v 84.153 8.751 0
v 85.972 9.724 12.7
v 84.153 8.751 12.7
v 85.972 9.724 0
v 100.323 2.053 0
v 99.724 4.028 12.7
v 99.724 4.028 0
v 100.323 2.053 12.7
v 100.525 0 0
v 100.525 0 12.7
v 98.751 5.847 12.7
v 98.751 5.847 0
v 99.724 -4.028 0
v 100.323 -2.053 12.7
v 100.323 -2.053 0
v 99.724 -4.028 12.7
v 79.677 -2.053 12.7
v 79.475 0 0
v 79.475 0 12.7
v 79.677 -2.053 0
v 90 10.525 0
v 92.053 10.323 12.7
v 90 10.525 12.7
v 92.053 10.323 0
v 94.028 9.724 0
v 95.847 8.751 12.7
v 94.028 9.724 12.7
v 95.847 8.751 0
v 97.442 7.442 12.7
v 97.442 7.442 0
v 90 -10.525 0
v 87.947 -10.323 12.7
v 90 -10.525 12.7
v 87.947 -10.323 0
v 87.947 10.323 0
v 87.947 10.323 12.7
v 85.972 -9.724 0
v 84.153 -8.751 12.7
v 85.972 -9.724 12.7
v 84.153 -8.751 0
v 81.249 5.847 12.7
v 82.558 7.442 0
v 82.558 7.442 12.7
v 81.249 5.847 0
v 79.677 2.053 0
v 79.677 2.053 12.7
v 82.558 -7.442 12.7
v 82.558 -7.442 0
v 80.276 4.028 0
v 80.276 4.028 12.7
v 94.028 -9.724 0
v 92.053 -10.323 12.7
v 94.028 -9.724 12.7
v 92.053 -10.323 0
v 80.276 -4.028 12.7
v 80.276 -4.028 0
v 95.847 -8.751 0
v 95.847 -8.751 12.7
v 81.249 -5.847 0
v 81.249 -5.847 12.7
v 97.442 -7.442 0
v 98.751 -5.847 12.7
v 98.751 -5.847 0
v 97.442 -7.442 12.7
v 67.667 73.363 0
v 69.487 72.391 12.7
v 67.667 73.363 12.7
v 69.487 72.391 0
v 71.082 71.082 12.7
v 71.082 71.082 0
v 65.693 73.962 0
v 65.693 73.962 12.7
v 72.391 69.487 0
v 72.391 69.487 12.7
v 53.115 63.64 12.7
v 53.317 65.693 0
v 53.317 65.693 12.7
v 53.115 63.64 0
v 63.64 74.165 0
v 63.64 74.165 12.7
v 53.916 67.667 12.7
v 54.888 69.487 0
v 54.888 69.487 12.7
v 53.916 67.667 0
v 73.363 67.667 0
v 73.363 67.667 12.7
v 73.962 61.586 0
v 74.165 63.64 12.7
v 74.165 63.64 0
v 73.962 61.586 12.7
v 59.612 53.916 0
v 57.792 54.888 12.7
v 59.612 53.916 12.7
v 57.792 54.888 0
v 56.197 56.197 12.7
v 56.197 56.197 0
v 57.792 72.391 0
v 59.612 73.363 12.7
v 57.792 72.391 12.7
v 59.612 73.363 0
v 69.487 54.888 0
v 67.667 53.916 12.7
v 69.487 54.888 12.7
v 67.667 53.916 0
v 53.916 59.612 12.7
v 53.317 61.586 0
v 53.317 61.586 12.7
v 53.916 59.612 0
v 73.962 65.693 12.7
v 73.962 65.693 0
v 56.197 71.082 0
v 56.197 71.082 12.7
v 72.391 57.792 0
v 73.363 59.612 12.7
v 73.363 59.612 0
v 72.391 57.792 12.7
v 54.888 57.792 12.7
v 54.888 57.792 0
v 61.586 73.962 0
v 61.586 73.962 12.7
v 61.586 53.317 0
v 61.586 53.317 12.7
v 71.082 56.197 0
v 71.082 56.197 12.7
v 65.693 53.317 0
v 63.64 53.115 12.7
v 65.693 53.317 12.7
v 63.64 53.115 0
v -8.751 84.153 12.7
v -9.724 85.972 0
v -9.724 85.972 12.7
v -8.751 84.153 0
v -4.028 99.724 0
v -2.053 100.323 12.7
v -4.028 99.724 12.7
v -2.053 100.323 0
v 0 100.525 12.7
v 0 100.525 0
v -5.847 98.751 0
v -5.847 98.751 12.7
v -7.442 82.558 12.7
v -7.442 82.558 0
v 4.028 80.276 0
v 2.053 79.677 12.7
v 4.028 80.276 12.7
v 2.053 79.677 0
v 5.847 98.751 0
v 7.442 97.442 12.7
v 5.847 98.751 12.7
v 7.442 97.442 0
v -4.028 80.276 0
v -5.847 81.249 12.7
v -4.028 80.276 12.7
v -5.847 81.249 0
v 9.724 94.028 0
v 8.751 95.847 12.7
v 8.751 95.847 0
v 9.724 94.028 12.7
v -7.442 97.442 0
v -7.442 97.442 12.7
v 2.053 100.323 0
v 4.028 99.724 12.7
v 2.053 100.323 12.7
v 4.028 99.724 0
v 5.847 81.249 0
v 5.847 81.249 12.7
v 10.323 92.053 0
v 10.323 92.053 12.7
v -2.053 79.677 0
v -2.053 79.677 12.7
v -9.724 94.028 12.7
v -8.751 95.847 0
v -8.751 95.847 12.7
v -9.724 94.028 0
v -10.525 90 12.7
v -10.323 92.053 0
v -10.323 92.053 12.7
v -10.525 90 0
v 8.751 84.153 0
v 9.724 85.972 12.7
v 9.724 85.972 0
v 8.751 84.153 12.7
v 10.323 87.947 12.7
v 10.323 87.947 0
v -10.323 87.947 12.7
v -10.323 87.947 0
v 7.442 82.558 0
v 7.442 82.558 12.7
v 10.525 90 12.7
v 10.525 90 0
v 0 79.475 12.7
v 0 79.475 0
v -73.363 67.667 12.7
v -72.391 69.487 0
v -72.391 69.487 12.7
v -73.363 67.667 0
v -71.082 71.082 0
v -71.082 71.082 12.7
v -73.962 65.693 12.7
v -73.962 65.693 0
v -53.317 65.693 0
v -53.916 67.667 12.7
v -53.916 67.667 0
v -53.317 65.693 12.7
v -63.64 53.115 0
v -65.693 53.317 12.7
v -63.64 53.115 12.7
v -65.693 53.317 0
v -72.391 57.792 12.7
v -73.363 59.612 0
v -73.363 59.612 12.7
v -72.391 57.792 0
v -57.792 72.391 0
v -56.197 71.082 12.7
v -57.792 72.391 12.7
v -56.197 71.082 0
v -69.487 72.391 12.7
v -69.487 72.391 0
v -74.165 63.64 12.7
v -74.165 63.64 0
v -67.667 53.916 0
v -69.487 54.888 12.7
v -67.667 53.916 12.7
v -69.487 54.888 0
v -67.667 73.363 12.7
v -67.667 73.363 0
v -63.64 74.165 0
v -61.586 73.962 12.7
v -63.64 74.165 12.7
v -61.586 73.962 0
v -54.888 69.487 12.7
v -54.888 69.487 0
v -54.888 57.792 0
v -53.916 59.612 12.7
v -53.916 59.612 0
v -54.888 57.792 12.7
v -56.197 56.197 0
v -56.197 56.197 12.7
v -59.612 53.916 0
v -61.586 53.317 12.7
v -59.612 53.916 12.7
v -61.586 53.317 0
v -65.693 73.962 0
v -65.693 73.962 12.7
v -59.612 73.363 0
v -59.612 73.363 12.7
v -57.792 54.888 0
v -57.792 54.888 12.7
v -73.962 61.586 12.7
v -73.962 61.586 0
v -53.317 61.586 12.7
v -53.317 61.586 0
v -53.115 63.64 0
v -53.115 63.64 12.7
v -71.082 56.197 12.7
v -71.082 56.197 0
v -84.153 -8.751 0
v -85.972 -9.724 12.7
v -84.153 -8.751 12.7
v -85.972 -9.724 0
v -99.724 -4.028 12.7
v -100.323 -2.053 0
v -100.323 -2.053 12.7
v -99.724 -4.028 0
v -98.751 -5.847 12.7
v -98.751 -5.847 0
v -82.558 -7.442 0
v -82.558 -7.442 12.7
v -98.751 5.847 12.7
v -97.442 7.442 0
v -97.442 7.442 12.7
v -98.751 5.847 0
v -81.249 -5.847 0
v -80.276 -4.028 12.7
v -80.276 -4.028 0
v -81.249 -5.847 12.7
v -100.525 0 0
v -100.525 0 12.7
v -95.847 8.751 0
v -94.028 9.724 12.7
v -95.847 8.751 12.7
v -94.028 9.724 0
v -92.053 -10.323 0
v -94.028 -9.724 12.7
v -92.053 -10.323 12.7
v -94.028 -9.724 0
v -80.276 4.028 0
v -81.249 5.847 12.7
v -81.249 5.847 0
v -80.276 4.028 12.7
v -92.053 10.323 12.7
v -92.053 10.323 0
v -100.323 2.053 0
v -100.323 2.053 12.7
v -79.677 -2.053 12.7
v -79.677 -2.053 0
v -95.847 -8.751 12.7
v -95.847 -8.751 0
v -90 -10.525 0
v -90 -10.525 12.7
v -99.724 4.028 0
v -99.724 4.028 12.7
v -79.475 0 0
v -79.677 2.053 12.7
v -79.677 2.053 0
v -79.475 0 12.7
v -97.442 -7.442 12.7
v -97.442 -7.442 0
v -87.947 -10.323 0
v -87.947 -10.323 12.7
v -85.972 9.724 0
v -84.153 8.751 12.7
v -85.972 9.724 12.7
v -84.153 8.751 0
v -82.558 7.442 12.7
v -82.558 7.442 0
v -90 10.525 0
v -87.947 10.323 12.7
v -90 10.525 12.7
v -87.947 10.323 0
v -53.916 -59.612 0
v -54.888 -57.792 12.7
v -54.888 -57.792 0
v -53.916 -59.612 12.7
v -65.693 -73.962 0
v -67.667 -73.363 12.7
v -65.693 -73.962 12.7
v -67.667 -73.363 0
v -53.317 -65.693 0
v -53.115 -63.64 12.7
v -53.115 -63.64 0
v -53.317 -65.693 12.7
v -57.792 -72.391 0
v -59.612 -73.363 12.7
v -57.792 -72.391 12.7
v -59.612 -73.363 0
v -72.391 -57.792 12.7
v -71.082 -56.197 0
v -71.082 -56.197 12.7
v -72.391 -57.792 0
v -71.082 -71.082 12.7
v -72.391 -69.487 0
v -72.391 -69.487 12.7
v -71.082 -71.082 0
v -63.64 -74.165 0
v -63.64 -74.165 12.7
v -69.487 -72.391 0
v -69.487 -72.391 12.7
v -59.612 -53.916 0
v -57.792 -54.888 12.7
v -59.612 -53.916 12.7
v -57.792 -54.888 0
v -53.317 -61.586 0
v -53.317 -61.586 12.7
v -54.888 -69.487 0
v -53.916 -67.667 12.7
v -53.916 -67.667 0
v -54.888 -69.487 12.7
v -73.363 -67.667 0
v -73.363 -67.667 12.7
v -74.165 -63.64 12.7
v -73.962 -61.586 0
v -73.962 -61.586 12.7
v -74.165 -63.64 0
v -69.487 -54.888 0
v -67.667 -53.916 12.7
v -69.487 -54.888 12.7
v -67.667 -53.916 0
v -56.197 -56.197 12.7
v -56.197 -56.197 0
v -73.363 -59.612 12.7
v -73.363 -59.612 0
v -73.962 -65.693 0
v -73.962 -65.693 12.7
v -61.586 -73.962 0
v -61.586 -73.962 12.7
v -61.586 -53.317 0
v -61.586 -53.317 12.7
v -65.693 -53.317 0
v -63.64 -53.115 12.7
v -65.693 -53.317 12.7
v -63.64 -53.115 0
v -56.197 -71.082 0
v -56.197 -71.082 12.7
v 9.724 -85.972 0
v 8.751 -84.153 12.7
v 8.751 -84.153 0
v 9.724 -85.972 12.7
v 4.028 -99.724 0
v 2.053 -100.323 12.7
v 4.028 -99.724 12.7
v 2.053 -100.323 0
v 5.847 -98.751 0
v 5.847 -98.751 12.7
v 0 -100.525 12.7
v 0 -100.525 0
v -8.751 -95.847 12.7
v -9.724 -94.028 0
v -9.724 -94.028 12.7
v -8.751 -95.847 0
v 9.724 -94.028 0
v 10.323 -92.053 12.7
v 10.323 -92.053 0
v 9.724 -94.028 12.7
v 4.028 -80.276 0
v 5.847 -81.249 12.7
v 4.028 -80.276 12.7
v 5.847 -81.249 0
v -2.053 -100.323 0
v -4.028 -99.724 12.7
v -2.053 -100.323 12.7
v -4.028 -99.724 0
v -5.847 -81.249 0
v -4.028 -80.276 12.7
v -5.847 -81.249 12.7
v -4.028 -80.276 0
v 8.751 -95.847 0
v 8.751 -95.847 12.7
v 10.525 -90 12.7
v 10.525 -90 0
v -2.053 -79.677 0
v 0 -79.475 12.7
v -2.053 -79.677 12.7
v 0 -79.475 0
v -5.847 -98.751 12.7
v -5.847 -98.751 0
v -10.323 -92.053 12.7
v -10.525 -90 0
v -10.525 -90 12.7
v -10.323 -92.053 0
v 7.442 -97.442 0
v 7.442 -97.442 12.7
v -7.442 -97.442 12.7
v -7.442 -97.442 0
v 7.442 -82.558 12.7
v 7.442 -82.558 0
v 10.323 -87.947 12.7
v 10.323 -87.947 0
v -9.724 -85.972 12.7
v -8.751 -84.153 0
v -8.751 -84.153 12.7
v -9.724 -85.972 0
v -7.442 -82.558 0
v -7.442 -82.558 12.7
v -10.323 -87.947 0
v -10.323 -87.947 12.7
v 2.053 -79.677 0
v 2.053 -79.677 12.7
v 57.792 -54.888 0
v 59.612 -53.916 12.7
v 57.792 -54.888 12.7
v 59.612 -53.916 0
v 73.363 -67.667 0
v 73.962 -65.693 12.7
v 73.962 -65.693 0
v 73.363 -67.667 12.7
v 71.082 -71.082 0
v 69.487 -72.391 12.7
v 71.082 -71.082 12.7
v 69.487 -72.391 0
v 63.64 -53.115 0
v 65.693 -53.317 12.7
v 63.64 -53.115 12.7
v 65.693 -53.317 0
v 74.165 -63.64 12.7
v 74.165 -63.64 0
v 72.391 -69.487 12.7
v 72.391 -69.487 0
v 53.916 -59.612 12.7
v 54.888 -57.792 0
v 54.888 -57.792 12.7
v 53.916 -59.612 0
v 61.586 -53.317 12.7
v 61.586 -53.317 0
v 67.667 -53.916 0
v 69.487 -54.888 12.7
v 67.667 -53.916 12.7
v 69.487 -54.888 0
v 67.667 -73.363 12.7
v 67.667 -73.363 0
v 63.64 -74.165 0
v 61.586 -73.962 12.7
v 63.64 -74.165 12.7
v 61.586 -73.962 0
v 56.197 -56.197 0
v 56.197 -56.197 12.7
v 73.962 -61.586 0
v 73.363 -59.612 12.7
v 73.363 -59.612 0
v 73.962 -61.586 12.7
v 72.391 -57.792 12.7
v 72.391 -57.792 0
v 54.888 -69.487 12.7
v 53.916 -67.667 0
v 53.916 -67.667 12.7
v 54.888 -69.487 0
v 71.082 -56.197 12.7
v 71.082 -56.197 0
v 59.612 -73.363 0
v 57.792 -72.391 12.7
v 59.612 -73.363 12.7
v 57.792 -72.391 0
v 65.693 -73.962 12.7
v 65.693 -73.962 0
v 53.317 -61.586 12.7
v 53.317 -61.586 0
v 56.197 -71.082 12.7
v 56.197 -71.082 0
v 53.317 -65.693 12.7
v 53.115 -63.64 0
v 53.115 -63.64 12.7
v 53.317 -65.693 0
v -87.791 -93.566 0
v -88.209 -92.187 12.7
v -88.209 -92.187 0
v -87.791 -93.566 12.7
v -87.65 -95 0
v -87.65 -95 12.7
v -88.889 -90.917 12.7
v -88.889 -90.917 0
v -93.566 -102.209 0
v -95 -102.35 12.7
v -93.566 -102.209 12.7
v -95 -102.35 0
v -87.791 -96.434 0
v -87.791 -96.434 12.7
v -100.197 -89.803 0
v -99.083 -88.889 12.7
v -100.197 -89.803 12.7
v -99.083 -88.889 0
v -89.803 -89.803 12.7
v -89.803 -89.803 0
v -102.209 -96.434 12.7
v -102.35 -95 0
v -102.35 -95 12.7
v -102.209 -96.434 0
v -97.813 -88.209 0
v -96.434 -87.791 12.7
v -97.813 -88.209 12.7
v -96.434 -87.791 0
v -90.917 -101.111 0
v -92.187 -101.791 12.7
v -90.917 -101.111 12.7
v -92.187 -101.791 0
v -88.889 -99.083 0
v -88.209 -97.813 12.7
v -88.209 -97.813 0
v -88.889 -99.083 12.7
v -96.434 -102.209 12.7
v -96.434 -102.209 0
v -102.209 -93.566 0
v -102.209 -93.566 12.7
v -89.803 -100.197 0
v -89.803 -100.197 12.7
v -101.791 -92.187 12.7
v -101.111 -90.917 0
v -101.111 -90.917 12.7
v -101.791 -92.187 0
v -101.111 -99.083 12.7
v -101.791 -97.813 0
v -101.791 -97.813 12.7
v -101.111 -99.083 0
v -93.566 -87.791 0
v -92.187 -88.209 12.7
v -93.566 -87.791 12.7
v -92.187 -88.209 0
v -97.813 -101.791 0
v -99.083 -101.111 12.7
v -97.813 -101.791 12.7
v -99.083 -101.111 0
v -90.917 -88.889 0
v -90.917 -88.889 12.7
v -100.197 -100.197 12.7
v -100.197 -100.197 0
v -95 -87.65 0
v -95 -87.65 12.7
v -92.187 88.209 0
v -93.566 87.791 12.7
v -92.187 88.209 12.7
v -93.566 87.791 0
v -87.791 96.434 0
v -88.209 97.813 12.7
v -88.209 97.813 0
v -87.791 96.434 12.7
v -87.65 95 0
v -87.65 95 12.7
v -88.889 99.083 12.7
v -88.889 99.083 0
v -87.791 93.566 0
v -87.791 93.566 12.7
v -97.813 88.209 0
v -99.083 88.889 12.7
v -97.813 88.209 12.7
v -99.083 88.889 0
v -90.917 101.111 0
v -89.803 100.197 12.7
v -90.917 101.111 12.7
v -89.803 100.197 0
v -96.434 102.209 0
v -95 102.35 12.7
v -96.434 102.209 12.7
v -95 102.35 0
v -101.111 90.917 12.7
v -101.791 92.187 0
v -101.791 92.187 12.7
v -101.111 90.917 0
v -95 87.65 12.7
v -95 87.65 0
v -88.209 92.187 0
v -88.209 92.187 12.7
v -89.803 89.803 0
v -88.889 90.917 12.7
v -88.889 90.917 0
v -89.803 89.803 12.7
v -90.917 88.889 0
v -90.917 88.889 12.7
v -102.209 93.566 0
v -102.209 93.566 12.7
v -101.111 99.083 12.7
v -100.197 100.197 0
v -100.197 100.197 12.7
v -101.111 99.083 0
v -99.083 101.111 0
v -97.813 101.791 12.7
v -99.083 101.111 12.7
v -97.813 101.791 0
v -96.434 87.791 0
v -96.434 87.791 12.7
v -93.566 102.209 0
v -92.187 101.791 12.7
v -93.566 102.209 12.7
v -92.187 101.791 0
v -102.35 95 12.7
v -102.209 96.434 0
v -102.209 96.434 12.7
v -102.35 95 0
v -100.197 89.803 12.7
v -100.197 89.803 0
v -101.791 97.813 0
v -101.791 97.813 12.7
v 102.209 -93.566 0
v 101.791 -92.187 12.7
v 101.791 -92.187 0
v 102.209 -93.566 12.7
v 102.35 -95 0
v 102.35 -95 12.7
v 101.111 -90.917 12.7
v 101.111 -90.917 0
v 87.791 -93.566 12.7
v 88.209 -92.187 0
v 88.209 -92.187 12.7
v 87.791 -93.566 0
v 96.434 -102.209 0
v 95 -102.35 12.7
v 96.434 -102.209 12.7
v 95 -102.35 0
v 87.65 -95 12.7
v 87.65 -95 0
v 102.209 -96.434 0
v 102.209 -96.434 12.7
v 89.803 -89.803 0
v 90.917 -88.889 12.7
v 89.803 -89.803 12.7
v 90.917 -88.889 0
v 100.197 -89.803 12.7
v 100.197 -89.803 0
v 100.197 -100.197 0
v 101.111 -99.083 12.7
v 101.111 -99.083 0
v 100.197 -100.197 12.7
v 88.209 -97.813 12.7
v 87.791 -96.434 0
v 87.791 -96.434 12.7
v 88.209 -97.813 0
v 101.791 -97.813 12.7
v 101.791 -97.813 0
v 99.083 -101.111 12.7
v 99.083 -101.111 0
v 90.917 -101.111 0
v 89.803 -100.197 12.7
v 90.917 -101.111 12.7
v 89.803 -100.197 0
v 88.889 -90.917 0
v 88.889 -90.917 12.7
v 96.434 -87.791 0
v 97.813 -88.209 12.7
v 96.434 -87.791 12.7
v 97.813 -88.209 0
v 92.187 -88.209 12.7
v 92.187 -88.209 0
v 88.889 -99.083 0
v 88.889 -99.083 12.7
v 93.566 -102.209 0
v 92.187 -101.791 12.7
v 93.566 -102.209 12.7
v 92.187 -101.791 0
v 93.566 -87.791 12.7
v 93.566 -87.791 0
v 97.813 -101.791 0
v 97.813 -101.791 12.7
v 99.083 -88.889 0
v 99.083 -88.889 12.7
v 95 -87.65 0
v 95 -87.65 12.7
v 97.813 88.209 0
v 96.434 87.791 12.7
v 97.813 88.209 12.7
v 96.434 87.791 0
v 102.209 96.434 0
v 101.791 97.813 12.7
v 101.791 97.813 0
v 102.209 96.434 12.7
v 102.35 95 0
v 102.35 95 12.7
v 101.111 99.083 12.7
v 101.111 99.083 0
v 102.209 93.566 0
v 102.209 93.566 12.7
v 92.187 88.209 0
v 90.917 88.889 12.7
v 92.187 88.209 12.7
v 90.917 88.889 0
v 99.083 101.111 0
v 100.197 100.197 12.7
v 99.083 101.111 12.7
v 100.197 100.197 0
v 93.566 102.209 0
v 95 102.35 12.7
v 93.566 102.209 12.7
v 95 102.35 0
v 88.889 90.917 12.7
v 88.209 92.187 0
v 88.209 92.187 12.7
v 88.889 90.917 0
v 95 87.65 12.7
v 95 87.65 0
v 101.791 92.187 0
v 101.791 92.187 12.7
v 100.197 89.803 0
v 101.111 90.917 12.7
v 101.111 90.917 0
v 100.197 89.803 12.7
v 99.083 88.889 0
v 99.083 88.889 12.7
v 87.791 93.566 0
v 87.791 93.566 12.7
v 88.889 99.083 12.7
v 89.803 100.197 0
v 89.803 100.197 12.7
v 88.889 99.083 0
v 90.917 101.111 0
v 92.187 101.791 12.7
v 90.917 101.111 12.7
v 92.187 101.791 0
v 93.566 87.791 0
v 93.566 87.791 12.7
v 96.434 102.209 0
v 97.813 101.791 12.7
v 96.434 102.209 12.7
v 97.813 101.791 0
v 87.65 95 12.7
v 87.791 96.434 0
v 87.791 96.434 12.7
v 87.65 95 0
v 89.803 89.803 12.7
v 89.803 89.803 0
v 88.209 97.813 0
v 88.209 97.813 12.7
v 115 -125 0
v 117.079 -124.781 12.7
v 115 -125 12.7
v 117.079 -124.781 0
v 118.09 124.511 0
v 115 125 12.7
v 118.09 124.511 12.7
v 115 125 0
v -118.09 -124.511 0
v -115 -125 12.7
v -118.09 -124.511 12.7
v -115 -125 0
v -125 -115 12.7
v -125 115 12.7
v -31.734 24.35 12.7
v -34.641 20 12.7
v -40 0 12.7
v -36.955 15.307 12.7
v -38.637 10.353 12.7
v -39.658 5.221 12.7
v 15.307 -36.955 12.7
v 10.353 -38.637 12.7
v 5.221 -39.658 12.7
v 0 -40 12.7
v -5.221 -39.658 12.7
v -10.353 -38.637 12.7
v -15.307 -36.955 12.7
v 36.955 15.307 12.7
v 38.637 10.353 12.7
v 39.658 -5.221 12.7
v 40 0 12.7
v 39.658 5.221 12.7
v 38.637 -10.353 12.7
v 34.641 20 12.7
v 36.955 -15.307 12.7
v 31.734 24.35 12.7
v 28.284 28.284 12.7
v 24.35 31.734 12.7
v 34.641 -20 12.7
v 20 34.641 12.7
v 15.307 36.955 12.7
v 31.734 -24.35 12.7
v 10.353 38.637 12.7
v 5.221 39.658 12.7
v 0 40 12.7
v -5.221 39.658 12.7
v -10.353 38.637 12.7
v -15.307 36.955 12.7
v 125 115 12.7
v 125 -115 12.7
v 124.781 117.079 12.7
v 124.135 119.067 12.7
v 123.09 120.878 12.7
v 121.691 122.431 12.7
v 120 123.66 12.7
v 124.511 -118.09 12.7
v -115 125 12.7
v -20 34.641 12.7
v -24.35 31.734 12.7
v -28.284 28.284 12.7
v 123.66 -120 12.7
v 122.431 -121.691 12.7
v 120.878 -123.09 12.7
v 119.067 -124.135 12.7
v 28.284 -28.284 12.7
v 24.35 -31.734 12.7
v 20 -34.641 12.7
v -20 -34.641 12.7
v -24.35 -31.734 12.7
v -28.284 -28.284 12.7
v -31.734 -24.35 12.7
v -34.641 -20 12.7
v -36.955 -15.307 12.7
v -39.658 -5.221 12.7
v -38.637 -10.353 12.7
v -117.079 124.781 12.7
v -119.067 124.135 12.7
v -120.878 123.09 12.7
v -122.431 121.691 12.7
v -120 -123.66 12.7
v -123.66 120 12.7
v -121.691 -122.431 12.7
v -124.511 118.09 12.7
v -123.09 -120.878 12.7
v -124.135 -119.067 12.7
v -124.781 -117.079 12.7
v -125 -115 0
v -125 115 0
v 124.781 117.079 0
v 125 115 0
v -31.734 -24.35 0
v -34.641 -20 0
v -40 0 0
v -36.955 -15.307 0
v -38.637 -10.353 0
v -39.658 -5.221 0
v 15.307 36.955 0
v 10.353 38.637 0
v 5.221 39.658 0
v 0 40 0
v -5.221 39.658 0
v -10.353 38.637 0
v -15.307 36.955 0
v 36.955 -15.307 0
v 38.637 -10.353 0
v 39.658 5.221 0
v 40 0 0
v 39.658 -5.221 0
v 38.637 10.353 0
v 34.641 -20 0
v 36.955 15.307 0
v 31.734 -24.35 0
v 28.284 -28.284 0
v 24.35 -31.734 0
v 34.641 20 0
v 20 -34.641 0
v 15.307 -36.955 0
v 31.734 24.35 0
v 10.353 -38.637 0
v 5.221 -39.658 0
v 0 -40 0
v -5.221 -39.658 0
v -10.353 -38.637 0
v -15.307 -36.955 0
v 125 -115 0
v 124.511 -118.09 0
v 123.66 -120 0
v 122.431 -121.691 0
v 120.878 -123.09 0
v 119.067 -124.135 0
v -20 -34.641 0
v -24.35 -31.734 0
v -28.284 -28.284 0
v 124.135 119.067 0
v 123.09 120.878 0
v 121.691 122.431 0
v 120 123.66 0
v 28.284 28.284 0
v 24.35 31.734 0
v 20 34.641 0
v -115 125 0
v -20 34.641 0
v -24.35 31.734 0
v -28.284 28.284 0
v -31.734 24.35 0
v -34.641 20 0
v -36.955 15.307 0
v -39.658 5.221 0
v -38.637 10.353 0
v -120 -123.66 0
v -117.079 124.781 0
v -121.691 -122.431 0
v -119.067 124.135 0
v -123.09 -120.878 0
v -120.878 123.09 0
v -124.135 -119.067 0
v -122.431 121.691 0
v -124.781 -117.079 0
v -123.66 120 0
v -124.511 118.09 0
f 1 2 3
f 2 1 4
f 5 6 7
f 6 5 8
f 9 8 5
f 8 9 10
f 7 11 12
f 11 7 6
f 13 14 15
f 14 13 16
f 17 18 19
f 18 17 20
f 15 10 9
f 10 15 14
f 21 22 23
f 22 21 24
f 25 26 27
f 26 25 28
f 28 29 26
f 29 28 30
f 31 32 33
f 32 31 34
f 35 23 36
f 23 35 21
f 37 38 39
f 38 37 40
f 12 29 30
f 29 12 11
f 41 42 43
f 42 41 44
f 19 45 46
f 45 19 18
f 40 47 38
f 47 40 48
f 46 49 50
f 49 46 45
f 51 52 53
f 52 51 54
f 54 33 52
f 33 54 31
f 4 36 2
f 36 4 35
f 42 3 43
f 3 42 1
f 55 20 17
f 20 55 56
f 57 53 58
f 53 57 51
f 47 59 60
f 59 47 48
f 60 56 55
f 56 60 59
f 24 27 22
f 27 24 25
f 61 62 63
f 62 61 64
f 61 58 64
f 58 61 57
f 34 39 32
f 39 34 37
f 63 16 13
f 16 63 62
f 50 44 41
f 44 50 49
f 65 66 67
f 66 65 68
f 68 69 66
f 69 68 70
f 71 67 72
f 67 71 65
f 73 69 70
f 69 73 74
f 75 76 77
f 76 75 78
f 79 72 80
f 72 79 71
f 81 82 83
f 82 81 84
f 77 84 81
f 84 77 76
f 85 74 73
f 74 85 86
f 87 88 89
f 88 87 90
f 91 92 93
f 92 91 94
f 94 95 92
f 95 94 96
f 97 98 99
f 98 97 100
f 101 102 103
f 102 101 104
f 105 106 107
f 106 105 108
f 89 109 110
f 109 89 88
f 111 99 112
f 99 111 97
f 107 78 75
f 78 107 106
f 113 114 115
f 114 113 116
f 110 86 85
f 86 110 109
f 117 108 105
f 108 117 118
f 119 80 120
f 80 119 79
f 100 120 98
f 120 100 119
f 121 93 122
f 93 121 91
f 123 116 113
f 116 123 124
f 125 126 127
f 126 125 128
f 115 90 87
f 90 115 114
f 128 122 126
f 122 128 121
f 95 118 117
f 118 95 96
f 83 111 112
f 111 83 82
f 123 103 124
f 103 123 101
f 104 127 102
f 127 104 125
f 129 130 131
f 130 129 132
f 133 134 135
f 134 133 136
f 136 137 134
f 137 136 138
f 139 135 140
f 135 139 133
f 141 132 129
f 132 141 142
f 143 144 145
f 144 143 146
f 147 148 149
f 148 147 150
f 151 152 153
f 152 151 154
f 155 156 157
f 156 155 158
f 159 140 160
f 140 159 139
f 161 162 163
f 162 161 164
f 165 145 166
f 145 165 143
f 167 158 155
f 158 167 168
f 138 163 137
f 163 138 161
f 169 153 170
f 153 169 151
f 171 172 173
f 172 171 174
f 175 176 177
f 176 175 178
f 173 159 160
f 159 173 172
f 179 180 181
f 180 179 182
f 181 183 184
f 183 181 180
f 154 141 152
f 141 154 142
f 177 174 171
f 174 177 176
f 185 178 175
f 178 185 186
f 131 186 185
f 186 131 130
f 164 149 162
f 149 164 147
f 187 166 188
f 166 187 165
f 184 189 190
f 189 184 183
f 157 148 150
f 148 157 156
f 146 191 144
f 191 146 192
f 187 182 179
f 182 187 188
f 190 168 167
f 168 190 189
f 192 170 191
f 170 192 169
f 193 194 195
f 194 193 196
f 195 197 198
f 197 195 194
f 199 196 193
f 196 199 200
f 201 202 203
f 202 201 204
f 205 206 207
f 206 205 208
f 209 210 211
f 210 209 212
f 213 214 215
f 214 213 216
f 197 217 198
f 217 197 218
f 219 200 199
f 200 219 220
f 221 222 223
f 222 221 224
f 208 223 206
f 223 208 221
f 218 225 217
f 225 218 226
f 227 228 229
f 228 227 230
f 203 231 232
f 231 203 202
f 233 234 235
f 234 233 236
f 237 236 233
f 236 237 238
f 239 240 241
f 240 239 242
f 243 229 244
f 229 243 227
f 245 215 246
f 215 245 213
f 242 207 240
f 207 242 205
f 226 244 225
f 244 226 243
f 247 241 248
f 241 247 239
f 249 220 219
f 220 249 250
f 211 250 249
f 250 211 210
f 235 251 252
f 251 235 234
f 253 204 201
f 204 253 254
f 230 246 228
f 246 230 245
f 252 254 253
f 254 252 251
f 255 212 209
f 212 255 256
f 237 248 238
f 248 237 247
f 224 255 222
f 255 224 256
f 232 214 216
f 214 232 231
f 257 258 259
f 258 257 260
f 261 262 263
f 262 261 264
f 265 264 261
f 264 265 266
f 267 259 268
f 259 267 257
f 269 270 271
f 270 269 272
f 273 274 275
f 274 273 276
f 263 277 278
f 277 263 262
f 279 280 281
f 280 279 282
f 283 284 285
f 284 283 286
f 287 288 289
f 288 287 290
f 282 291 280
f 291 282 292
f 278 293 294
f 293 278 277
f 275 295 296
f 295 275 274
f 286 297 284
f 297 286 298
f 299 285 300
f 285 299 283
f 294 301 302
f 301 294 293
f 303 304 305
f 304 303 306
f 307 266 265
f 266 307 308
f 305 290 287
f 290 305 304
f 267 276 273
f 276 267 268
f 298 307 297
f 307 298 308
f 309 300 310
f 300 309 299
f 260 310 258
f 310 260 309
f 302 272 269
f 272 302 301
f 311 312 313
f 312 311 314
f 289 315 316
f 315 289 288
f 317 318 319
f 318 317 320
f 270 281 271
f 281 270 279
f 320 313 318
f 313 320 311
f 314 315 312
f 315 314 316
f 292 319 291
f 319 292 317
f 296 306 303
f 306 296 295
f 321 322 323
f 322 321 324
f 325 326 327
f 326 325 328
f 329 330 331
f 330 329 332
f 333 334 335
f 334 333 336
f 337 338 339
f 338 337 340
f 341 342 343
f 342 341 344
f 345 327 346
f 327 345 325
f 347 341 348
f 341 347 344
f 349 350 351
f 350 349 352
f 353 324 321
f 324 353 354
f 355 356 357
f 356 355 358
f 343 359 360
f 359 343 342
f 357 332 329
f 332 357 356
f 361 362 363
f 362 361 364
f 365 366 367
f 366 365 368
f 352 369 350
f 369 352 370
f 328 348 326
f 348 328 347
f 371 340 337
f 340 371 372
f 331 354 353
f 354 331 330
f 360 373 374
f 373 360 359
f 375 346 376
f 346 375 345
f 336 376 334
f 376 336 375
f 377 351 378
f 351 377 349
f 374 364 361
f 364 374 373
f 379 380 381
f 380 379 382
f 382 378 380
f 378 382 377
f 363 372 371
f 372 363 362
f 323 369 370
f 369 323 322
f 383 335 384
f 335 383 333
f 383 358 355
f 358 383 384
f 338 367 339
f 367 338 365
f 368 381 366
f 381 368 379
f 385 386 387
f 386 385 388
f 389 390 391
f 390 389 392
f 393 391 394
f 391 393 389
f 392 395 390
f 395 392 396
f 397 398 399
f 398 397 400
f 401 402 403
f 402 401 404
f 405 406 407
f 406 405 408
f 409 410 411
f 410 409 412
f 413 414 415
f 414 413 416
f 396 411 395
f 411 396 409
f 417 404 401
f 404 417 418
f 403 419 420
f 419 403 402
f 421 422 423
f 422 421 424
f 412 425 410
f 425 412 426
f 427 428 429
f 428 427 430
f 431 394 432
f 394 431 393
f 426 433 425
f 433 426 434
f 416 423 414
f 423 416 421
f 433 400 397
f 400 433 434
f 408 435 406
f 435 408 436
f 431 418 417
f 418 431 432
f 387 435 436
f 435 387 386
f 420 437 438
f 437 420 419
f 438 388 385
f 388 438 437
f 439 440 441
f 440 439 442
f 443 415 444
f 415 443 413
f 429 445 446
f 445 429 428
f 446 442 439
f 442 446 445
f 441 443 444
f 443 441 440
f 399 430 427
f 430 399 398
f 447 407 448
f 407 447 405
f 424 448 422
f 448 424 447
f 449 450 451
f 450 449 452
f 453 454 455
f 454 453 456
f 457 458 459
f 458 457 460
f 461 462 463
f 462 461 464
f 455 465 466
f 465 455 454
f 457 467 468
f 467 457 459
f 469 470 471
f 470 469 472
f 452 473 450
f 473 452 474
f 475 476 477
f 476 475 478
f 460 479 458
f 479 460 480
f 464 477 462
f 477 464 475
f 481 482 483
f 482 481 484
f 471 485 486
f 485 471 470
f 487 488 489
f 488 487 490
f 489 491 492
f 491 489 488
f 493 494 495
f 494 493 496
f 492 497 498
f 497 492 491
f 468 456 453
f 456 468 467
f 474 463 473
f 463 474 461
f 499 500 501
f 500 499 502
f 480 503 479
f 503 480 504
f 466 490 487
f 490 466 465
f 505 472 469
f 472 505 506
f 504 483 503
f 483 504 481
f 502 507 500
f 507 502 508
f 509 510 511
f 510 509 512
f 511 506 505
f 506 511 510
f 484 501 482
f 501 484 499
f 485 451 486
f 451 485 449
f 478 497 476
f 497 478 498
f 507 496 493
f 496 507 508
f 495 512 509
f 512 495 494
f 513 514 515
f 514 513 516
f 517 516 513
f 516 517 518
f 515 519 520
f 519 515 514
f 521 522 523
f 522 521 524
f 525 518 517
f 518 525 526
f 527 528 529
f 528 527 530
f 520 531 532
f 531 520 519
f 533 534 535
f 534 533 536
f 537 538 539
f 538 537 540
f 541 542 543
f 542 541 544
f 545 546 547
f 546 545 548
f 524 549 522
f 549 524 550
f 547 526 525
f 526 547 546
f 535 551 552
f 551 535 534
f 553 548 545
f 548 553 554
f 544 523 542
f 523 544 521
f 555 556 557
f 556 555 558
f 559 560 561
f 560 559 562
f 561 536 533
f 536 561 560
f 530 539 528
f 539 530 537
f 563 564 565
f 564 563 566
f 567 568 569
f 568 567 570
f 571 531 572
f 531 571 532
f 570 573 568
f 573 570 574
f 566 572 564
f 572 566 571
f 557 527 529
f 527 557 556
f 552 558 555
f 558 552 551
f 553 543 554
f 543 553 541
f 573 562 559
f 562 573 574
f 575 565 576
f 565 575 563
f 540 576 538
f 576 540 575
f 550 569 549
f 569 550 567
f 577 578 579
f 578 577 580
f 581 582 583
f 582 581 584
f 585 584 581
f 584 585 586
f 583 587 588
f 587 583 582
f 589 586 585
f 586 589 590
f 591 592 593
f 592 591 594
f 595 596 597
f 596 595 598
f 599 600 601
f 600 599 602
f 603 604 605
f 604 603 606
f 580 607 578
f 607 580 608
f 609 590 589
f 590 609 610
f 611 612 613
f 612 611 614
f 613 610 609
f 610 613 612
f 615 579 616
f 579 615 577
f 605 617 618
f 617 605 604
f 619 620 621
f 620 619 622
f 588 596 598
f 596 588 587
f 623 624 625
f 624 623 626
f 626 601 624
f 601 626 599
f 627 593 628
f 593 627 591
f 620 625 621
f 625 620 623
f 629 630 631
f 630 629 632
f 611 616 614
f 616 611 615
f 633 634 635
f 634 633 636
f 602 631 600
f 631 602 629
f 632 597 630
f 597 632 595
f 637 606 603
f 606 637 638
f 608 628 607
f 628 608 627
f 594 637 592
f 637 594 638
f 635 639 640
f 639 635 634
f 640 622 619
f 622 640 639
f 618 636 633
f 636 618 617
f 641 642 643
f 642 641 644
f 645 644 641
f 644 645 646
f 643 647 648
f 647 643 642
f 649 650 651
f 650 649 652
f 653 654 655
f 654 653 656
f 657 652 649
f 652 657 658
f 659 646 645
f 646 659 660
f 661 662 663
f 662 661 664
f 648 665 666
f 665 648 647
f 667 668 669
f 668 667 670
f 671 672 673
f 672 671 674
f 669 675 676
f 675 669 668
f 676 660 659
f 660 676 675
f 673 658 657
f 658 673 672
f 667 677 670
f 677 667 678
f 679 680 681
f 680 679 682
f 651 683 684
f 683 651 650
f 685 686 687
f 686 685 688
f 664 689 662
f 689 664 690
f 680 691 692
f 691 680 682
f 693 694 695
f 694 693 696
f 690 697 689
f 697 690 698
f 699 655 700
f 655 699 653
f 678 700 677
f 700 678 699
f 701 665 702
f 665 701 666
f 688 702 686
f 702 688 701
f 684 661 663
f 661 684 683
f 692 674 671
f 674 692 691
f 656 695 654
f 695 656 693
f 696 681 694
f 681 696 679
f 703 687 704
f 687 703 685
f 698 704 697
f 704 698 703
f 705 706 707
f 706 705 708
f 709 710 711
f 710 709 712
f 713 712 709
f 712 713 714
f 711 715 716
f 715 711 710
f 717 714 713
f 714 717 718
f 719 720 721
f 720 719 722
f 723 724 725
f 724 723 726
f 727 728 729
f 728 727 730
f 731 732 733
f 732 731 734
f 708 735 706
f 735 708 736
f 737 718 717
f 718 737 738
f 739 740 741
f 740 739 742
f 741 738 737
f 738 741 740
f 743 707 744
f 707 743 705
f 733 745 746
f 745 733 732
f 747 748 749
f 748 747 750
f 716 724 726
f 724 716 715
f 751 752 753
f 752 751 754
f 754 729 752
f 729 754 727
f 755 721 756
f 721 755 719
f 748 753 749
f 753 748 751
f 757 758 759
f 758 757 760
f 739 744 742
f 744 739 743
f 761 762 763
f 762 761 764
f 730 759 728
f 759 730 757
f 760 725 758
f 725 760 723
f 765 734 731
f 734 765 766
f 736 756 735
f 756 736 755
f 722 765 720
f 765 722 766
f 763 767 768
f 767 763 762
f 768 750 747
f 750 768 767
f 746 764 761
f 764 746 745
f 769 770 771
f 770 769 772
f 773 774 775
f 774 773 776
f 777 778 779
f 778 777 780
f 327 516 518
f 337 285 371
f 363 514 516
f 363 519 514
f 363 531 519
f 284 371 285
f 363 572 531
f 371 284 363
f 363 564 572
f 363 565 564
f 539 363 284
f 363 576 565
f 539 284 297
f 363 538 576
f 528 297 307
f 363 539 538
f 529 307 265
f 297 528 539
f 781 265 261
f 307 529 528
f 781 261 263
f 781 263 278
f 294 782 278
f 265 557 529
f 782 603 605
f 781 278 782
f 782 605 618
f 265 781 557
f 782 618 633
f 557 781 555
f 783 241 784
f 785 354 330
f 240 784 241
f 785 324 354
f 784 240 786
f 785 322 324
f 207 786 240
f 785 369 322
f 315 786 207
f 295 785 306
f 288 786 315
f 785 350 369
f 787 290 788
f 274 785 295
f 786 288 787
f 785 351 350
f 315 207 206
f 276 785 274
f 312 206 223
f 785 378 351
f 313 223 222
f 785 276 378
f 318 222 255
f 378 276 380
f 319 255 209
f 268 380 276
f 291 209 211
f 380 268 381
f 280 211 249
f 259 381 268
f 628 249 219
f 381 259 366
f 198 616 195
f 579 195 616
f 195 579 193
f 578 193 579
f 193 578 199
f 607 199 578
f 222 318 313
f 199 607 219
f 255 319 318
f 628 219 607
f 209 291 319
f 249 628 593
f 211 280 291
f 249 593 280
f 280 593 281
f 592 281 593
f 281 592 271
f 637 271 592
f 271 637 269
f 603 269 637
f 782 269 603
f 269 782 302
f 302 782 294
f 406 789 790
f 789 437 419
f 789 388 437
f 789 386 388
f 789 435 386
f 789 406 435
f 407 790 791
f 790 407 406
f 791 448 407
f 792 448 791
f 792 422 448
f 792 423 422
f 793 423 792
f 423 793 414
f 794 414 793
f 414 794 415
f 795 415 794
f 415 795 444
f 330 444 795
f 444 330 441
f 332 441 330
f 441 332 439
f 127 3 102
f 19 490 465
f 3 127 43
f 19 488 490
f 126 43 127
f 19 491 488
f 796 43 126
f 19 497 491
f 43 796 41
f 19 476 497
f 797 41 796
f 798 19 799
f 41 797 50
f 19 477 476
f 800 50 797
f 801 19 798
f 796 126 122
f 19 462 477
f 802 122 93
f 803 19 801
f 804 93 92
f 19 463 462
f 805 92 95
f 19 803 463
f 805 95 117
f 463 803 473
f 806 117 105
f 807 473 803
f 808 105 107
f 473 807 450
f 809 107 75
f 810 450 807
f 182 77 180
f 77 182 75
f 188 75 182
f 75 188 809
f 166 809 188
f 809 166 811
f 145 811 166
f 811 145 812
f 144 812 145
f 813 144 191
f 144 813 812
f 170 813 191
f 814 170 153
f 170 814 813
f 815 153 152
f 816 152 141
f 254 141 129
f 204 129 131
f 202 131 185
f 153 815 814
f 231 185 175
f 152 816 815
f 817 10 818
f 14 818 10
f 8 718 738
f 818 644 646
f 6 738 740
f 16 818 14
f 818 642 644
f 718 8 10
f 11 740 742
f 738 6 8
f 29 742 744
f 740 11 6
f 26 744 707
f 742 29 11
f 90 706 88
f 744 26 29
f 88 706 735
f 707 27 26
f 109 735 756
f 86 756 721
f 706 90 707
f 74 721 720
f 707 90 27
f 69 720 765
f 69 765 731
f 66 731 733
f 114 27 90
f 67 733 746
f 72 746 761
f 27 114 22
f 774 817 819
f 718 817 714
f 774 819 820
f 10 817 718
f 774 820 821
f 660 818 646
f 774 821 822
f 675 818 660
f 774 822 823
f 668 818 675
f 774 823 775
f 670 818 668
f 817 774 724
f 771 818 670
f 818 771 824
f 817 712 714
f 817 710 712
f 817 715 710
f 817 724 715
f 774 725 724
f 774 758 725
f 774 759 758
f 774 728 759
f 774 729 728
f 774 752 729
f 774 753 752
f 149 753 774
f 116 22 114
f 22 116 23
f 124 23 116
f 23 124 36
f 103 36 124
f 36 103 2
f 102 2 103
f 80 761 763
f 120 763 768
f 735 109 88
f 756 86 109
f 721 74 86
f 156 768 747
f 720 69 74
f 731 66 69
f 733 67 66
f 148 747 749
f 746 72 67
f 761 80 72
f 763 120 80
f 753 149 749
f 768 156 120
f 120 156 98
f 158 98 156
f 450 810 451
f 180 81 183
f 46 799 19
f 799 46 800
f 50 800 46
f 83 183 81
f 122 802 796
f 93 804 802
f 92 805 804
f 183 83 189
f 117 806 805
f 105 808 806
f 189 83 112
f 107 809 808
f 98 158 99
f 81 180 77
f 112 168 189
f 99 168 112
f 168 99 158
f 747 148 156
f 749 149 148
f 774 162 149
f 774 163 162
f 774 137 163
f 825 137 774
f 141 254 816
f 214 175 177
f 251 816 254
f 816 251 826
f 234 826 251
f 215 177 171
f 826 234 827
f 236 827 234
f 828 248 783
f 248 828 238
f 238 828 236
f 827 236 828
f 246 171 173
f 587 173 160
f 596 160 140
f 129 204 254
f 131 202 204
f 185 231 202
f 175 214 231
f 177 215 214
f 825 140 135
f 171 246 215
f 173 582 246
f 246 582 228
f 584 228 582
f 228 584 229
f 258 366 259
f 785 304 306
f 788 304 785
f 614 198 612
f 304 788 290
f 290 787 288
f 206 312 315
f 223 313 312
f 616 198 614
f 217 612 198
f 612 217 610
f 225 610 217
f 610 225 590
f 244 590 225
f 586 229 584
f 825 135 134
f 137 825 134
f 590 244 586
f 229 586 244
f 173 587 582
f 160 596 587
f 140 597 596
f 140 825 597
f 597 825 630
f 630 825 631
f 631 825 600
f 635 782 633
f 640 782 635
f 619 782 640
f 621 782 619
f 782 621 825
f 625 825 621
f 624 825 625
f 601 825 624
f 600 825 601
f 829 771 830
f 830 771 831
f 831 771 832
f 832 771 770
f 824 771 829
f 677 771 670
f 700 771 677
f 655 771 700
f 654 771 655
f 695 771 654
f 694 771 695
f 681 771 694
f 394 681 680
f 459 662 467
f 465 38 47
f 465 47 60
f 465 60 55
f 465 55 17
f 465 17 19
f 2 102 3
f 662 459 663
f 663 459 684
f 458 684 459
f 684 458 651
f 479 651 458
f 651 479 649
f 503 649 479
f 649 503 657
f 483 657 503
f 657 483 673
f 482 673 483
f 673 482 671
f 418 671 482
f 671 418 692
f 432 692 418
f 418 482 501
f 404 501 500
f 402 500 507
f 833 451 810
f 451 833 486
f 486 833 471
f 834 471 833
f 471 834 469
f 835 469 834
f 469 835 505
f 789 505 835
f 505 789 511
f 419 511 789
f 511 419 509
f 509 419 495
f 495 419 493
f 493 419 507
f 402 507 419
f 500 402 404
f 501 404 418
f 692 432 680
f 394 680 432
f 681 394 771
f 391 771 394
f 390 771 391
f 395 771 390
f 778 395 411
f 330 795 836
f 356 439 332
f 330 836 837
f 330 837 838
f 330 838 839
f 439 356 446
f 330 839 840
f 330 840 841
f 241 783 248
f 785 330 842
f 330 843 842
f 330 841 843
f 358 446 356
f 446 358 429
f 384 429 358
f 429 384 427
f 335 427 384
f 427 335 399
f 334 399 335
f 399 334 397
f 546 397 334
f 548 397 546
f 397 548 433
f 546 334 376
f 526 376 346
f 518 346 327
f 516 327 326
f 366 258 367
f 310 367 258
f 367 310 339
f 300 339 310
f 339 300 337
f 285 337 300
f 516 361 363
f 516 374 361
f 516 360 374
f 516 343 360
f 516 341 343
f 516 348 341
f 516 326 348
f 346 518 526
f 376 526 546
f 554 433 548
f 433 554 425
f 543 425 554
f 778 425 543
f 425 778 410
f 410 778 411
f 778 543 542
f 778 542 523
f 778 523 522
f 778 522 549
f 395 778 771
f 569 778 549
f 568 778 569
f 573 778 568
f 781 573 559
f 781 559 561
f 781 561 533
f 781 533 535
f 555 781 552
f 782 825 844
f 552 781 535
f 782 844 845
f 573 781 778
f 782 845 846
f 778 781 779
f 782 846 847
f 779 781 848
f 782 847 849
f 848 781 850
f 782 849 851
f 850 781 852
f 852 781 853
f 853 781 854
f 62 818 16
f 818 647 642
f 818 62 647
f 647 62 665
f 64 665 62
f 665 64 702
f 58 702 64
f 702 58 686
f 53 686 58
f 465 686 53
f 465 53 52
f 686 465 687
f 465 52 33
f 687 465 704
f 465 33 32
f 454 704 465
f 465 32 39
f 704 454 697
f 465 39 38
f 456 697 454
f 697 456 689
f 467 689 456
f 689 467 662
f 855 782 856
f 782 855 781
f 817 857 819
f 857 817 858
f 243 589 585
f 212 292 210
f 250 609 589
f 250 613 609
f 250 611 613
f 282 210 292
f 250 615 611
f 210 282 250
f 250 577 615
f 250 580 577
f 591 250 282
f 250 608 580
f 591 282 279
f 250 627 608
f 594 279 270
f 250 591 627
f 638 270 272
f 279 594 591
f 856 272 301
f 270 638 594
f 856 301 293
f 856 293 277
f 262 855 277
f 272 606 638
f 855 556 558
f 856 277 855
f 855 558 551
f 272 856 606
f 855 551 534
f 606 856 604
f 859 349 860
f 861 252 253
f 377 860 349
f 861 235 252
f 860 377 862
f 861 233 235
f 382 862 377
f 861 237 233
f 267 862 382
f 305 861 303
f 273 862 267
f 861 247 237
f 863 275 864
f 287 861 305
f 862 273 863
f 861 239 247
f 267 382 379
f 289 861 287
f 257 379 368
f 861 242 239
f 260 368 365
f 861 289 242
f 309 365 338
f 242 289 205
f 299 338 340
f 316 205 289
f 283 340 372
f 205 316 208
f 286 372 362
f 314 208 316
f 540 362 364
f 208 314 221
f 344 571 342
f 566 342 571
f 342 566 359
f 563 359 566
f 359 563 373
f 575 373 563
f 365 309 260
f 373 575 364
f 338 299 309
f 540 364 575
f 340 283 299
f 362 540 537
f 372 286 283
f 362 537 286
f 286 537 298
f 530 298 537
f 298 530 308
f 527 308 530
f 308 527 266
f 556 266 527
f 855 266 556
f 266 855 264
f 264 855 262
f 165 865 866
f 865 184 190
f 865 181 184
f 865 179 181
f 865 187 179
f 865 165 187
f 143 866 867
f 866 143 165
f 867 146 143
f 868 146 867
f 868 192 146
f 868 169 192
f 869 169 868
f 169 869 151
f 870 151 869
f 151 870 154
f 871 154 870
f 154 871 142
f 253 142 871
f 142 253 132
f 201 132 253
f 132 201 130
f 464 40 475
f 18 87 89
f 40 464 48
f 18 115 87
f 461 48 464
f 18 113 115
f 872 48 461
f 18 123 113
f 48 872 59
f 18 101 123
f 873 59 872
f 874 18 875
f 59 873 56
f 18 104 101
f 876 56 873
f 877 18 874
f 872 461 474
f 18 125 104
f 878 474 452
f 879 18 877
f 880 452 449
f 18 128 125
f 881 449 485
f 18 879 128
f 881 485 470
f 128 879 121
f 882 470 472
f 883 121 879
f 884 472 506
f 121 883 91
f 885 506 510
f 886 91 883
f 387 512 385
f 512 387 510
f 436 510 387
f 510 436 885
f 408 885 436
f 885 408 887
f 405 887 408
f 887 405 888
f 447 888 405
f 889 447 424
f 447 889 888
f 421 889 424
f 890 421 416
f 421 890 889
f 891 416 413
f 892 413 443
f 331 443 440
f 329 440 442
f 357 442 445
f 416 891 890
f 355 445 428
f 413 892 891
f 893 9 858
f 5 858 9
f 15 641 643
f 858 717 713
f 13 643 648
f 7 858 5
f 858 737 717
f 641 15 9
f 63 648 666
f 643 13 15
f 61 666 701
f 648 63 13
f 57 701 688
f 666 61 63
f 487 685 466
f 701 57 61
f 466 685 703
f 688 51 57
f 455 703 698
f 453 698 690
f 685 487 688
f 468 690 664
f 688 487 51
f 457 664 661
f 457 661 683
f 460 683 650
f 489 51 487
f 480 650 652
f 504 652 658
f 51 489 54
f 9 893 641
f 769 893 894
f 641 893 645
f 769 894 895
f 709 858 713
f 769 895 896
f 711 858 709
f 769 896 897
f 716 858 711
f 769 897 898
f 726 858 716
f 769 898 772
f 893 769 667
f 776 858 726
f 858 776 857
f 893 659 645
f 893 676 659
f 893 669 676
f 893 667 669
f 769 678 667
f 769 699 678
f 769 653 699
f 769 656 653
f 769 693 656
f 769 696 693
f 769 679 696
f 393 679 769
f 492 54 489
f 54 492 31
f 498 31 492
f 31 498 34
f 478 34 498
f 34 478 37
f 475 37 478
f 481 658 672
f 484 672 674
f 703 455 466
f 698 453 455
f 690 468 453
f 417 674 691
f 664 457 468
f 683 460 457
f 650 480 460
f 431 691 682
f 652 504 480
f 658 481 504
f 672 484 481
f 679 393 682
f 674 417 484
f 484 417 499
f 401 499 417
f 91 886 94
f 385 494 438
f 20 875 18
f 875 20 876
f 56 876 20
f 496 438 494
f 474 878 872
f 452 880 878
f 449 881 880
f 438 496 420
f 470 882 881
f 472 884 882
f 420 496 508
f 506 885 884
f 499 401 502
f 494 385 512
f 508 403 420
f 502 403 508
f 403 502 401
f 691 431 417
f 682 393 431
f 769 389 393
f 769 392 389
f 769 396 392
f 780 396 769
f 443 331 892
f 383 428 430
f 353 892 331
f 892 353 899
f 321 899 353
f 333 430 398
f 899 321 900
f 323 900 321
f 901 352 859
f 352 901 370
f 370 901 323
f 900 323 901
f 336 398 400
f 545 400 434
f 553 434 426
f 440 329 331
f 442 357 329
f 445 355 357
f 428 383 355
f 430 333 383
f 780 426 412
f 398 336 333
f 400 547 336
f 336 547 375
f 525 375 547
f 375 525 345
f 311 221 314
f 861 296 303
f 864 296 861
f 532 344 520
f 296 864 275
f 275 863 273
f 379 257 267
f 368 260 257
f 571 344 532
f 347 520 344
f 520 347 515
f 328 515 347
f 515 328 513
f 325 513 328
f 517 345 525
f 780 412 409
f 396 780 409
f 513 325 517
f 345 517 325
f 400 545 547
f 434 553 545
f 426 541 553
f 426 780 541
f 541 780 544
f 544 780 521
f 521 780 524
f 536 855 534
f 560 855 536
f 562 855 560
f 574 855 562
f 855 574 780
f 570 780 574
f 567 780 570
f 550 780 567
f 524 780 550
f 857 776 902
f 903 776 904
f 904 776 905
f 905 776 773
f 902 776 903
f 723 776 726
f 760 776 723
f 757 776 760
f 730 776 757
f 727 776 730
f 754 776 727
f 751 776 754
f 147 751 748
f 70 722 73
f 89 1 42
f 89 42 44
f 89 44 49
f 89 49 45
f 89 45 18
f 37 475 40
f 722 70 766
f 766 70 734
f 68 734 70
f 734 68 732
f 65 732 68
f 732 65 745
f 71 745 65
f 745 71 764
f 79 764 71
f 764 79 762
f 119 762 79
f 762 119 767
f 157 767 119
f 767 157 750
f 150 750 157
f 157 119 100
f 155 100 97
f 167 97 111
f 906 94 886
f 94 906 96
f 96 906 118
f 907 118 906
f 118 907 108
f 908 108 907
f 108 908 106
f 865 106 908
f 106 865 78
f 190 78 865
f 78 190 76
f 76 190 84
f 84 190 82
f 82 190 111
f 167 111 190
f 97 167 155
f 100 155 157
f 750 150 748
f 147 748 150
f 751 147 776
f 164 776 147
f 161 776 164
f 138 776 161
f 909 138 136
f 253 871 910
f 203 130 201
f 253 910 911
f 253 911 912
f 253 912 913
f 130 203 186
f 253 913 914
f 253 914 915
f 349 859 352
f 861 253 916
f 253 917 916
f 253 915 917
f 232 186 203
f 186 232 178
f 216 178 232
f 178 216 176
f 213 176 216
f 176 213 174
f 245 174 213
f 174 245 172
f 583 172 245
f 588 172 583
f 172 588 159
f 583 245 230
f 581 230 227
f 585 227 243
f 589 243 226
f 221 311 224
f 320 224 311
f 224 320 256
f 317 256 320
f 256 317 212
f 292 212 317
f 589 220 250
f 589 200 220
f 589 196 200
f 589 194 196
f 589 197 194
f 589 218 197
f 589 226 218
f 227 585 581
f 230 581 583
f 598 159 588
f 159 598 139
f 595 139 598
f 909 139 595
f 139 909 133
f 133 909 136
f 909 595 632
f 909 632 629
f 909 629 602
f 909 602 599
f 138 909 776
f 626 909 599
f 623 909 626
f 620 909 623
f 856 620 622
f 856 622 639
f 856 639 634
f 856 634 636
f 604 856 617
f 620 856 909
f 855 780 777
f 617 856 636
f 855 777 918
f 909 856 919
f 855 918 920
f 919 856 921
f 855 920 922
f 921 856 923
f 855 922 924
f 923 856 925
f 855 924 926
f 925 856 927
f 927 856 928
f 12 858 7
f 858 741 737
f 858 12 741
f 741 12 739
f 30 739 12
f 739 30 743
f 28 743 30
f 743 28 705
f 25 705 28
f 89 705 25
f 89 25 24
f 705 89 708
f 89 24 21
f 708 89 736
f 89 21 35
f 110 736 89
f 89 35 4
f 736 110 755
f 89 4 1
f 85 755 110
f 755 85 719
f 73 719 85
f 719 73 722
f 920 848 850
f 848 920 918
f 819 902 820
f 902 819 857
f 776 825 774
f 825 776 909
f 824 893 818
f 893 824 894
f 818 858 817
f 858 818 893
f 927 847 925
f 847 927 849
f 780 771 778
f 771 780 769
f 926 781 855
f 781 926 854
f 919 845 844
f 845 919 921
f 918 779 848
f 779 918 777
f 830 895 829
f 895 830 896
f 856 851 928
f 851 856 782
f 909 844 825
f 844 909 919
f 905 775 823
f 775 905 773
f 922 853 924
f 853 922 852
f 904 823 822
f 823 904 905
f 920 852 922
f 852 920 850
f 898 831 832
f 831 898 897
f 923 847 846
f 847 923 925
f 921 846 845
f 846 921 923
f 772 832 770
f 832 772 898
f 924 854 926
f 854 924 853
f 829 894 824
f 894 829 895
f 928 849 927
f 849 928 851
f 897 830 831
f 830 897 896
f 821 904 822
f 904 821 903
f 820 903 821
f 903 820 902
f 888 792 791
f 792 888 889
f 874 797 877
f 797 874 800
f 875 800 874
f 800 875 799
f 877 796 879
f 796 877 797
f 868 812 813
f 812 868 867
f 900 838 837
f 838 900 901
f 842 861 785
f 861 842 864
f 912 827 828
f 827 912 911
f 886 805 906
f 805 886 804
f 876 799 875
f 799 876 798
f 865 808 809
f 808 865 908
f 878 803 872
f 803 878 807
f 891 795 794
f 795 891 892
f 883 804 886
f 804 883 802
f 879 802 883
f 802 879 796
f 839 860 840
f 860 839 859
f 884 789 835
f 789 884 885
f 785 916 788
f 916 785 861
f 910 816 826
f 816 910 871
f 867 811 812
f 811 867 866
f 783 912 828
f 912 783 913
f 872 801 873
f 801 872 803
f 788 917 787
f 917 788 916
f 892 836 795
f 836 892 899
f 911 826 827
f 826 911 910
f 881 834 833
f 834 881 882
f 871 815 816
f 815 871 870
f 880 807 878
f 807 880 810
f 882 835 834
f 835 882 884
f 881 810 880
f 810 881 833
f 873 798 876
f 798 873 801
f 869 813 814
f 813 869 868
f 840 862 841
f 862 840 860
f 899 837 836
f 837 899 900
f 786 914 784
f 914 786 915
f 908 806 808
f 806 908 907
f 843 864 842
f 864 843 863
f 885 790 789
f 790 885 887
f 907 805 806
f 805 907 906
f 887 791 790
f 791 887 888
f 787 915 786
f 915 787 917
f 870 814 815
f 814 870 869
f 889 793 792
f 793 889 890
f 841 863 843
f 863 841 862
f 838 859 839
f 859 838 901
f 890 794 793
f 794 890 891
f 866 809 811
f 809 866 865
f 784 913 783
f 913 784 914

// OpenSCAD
// wheel_mount.scad
// Wheel mounting plate for LifeTrac v25
// CNC cut from 1/2" plate steel
// Mounts hydraulic wheel motor

include <../openscad/lifetrac_v25_params.scad>

module wheel_mount() {
    plate_size = 250;
    
    difference() {
        // Main square plate with rounded corners
        linear_extrude(height=PLATE_1_2_INCH)
        offset(r=10) offset(r=-10)
        square([plate_size, plate_size], center=true);
        
        // Center hole for hydraulic motor shaft
        translate([0, 0, PLATE_1_2_INCH/2])
        cylinder(d=80, h=PLATE_1_2_INCH+4, center=true, $fn=48);
        
        // Bolt circle for motor mounting (8 bolts)
        for (angle = [0 : 45 : 315]) {
            rotate([0, 0, angle])
            translate([90, 0, PLATE_1_2_INCH/2])
            cylinder(d=BOLT_DIA_3_4 + 2, h=PLATE_1_2_INCH+4, center=true, $fn=32);
        }
        
        // Corner mounting holes for attaching to side panel (4 corners)
        for (x = [-1, 1]) {
            for (y = [-1, 1]) {
                translate([x * (plate_size/2 - 30), y * (plate_size/2 - 30), PLATE_1_2_INCH/2])
                cylinder(d=BOLT_DIA_1_2 + 2, h=PLATE_1_2_INCH+4, center=true, $fn=32);
            }
        }
    }
}

// Render the part for preview/export
if ($preview || len(search("wheel_mount.scad", parent_modules())) == 0) {
    wheel_mount();
}
